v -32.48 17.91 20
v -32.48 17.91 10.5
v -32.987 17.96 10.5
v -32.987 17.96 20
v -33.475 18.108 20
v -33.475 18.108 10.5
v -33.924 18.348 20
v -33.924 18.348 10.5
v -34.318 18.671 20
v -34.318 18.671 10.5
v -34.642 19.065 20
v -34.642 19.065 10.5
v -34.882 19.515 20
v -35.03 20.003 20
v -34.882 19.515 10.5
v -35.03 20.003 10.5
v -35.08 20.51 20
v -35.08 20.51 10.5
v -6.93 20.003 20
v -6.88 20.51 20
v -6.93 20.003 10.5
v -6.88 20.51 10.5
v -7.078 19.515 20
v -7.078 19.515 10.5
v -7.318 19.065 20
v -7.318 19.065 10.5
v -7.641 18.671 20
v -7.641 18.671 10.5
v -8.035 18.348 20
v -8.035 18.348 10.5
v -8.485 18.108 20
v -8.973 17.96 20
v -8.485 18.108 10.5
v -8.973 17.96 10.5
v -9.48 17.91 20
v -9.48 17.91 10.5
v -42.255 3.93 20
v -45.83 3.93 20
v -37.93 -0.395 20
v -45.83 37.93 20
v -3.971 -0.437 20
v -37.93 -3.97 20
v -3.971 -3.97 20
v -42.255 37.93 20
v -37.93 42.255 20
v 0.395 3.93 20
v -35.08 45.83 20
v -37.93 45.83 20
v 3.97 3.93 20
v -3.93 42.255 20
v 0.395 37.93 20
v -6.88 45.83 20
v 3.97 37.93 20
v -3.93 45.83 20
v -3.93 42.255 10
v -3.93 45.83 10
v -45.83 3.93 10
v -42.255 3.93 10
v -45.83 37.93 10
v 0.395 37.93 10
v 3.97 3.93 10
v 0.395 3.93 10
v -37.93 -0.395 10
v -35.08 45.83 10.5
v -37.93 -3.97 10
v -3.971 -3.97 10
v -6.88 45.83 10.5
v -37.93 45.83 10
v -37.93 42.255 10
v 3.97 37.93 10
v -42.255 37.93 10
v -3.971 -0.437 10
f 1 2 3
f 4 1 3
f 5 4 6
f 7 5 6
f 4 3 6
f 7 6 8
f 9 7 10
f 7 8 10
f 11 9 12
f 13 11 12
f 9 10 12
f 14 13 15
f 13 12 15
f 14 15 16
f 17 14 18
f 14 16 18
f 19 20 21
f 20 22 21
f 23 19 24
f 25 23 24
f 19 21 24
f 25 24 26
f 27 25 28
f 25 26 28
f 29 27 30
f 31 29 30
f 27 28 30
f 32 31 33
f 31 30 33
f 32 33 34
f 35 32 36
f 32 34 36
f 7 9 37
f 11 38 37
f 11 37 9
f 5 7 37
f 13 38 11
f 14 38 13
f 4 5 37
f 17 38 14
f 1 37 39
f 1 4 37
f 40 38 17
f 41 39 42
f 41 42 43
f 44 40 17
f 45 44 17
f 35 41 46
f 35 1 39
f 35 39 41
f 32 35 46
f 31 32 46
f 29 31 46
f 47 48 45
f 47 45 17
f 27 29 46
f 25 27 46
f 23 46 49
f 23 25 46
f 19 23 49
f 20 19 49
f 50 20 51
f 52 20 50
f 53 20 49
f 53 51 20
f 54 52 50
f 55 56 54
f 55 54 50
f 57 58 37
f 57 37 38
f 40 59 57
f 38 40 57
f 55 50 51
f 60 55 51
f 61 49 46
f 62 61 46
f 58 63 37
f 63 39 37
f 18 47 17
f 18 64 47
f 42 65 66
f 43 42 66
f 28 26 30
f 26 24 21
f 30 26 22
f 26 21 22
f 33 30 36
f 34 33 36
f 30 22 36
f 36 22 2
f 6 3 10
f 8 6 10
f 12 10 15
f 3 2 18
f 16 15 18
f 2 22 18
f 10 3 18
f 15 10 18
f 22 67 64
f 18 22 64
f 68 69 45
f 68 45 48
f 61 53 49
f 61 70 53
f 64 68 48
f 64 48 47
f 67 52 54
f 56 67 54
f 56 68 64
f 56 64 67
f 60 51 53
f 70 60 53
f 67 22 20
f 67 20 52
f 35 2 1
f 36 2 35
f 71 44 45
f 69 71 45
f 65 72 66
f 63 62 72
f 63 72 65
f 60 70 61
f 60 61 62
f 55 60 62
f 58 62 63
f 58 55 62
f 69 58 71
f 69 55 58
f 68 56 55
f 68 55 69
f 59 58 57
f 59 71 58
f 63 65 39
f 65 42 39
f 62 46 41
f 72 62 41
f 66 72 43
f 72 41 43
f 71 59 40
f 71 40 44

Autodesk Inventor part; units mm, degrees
ref_plane "YZ Plane" through (0, 0, 0) normal (1, 0, 0) x (0, 1, 0)
ref_plane "XZ Plane" through (0, 0, 0) normal (0, 1, 0) x (-1, 0, 0)
ref_plane "XY Plane" through (0, 0, 0) normal (0, 0, 1) x (1, 0, 0)
ref_plane "Work Plane5" through (0, 0, 10) normal (0, 0, 1) x (1, 0, 0)
sketch "Sketch1" plane through (0, 0, 10) normal (0, 0, 1) x (1, 0, 0)
  line L0 (-4.0299, -0.3538) -> (-2.2322, 1.4439) construction
  arc A0 (-1.4439, 2.2322) -> (-2.2322, 1.4439) centre (-0.9299, 0.9299) ccw construction
  line L1 (-1.4439, 2.2322) -> (0.3538, 4.0299) construction
  line L2 (-37.8299, 42.8299) -> (-37.8299, 37.8299) construction
  line L3 (-37.8299, 37.8299) -> (-42.9208, 37.8299) construction
  line L4 (-37.8299, 42.2137) -> (-37.8299, 45.8299) construction
  line L5 (-37.8299, 45.8299) -> (-4.0299, 45.8299) construction
  line L6 (-4.0299, 45.8299) -> (-4.0299, 42.2137) construction
  line L7 (-4.0299, 4.0299) -> (0.3538, 4.0299) projected
  circle A1 centre (-20.9299, 20.9299) radius 17.5 projected
  line L8 (-20.9299, 58.9723) -> (17.1124, 20.9299) construction
  line L9 (17.1124, 20.9299) -> (-20.9299, -17.1124) construction
  line L10 (-20.9299, -17.1124) -> (-58.9723, 20.9299) construction
  line L11 (-58.9723, 20.9299) -> (-20.9299, 58.9723) construction
  line L12 (-20.9299, 58.9723) -> (-20.9299, -17.1124) construction
  line L13 (17.1124, 20.9299) -> (-58.9723, 20.9299) construction
  line L14 (-20.9299, 58.9723) -> (32.8701, 58.9723) construction
  line L15 (-43.4299, 43.4299) -> (1.5701, 43.4299) construction
  line L16 (1.5701, 43.4299) -> (1.5701, -1.5701) construction
  line L17 (1.5701, -1.5701) -> (-43.4299, -1.5701) construction
  line L18 (-43.4299, -1.5701) -> (-43.4299, 43.4299) construction
  line L19 (-43.4299, 43.4299) -> (1.5701, -1.5701) construction
  line L20 (1.5701, 43.4299) -> (-43.4299, -1.5701) construction
  line L21 (-43.4299, 5.3876) -> (-43.4299, 36.4723)
  line L22 (-43.4299, 36.4723) -> (-36.4723, 43.4299)
  line L23 (-36.4723, 43.4299) -> (-5.3876, 43.4299)
  line L24 (-5.3876, 43.4299) -> (1.5701, 36.4723)
  line L25 (1.5701, 36.4723) -> (1.5701, 5.3876)
  line L26 (1.5701, 5.3876) -> (-5.3876, -1.5701)
  line L27 (-5.3876, -1.5701) -> (-36.4723, -1.5701)
  line L28 (-36.4723, -1.5701) -> (-43.4299, 5.3876)
  line L29 (-4.0299, 42.2137) -> (-37.8299, 42.2137) projected
  line L30 (-4.0299, -0.3538) -> (-4.0299, 4.0299) projected
  circle A2 centre (-20.9299, 20.9299) radius 1.5
  line L31 (-10.9299, 10.9299) -> (-30.9299, 10.9299) construction
  line L32 (-30.9299, 10.9299) -> (-30.9299, 30.9299) construction
  line L33 (-30.9299, 30.9299) -> (-10.9299, 30.9299) construction
  line L34 (-10.9299, 30.9299) -> (-10.9299, 10.9299) construction
  line L35 (-10.9299, 10.9299) -> (-30.9299, 30.9299) construction
  line L36 (-30.9299, 10.9299) -> (-10.9299, 30.9299) construction
  circle A3 centre (-30.9299, 30.9299) radius 1.4
  circle A4 centre (-30.9299, 10.9299) radius 1.4
  circle A5 centre (-10.9299, 10.9299) radius 1.4
  line L37 (-45.8299, 37.8299) -> (-42.0723, 37.8299) construction
  line L38 (-42.1723, 37.7299) -> (-45.8299, 37.7299)
  line L39 (-45.8299, 37.7299) -> (-45.8299, 4.1299)
  line L40 (-45.8299, 4.1299) -> (-42.1723, 4.1299)
  line L41 (-42.1723, 4.1299) -> (-42.1723, 37.7299)
  line L42 (-45.8299, 4.0299) -> (-42.0723, 4.0299) construction
  line L43 (-45.8299, 37.8299) -> (-42.0723, 37.8299) projected
  line L44 (-37.7299, 45.8299) -> (-4.1299, 45.8299)
  line L45 (-4.1299, 45.8299) -> (-4.1299, 42.1723)
  line L46 (-4.1299, 42.1723) -> (-37.7299, 42.1723)
  line L47 (-37.7299, 42.1723) -> (-37.7299, 45.8299)
  line L48 (0.4701, 37.8299) -> (0.4701, 4.0299) construction
  line L49 (0.4701, 4.0299) -> (3.9701, 4.0299) construction
  line L50 (3.9701, 37.8299) -> (3.9701, 4.0299) construction
  line L51 (0.4701, 37.8299) -> (3.9701, 37.8299) construction
  line L52 (-45.8299, -3.9701) -> (-4.0299, -3.9701) construction
  line L53 (0.3124, 37.7299) -> (3.9701, 37.7299)
  line L54 (3.9701, 37.7299) -> (3.9701, 4.1299)
  line L55 (3.9701, 4.1299) -> (0.3124, 4.1299)
  line L56 (0.3124, 4.1299) -> (0.3124, 37.7299)
  line L57 (-4.1713, -0.3538) -> (-37.7299, -0.3538)
  line L58 (-37.7299, -0.3538) -> (-37.7299, -3.9701)
  line L59 (-37.7299, -3.9701) -> (-4.1713, -3.9701)
  line L60 (-4.1713, -3.9701) -> (-4.1713, -0.3538)
  point P0 (-37.8299, 4.0299)
  dimension "d18" = 53.8
  dimension "d19" = 45
  dimension "d20" = 53.8
  dimension "d21" = 45
  dimension "d22" = 45
  dimension "d30" = 20
  dimension "d31" = 20
  dimension "d32" = 2.8
  dimension "d33" = 2.8
  dimension "d34" = 2.8
  dimension "d35" = 3
  dimension "d36" = 0.1
  dimension "d37" = 0.1
  dimension "d38" = 0.1
  dimension "d39" = 0.1
extrude "Extrusion1" add sketch "Sketch1" along normal blind 10 contours L30 L26 L57 L28 L41 L22 L46 L24 L56 L7 | L7 L26 L30 | L56 L24 L25 L26 | L26 L25 L24 L53 L54 L55 | L60 L59 L58 L57 L28 L27 L26 | L26 L27 L28 L57 | L46 L22 L29 L24 | L24 L29 L45 | L40 L39 L38 L22 L21 L28 | L28 L21 L22 L41 | L29 L22 L23 L24 | L24 L23 L22 L29 L47 L44 L45 | L47 L29 L22 | A1 | A2 | A3 | A4 | A5
sketch "Skizze4" plane through (0, 0, 20) normal (0, 0, 1) x (1, 0, 0)
  line L0 (-37.7299, 42.1723) -> (-42.1723, 37.7299) projected
  line L1 (-42.1723, 37.7299) -> (-45.8299, 37.7299) projected
  line L2 (-45.8299, 37.7299) -> (-45.8299, 4.1299) construction
  line L3 (-45.8299, 4.1299) -> (-42.1723, 4.1299) projected
  line L4 (-42.1723, 4.1299) -> (-37.6885, -0.3538) projected
  line L5 (-37.6885, -0.3538) -> (-37.7299, -0.3538) projected
  line L6 (-37.7299, -0.3538) -> (-37.7299, -3.9701) projected
  line L7 (-37.7299, -3.9701) -> (-4.1713, -3.9701) construction
  line L8 (-4.1713, -3.9701) -> (-4.1713, -0.3538) projected
  line L9 (-4.1713, -0.3538) -> (0.3124, 4.1299) projected
  line L10 (0.3124, 4.1299) -> (3.9701, 4.1299) projected
  line L11 (3.9701, 4.1299) -> (3.9701, 37.7299) construction
  line L12 (3.9701, 37.7299) -> (0.3124, 37.7299) projected
  line L13 (0.3124, 37.7299) -> (-4.1299, 42.1723) projected
  line L14 (-4.1299, 42.1723) -> (-4.1299, 45.8299) projected
  line L15 (-4.1299, 45.8299) -> (-37.7299, 45.8299) construction
  line L16 (-37.7299, 45.8299) -> (-37.7299, 42.1723) projected
  line L17 (-37.9299, 46.0299) -> (-3.9299, 46.0299) construction
  line L18 (-3.9299, 46.0299) -> (-3.9299, 42.2551)
  line L19 (-3.9299, 42.2551) -> (0.3953, 37.9299)
  line L20 (0.3953, 37.9299) -> (4.1701, 37.9299)
  line L21 (4.1701, 37.9299) -> (4.1701, 3.9299) construction
  line L22 (4.1701, 3.9299) -> (0.3953, 3.9299)
  line L23 (0.3953, 3.9299) -> (-3.9713, -0.4367)
  line L24 (-3.9713, -0.4367) -> (-3.9713, -4.1701)
  line L25 (-3.9713, -4.1701) -> (-37.9299, -4.1701) construction
  line L26 (-37.9299, -4.1701) -> (-37.9299, -0.3953)
  line L27 (-37.9299, -0.3953) -> (-42.2551, 3.9299)
  line L28 (-42.2551, 3.9299) -> (-46.0299, 3.9299)
  line L29 (-46.0299, 3.9299) -> (-46.0299, 37.9299) construction
  line L30 (-46.0299, 37.9299) -> (-42.2551, 37.9299)
  line L31 (-42.2551, 37.9299) -> (-37.9299, 42.2551)
  line L32 (-37.9299, 42.2551) -> (-37.9299, 46.0299)
  line L33 (-45.8299, 37.7299) -> (-45.8299, 37.9299)
  line L34 (-4.1299, 45.8299) -> (-37.7299, 45.8299) projected
  line L35 (-37.7299, 45.8299) -> (-37.9299, 45.8299)
  line L36 (-4.1299, 45.8299) -> (-3.9299, 45.8299)
  line L37 (3.9701, 37.7299) -> (3.9701, 37.9299)
  line L38 (3.9701, 4.1299) -> (3.9701, 37.7299) projected
  line L39 (3.9701, 4.1299) -> (3.9701, 3.9299)
  line L40 (-4.1713, -3.9701) -> (-3.9713, -3.9701)
  line L41 (-37.7299, -3.9701) -> (-37.9299, -3.9701)
  line L42 (-45.8299, 4.1299) -> (-45.8299, 3.9299)
  point P0 (0, 0)
  dimension "d40" = 0.2
extrude "IM_offset" add sketch "Skizze4" against normal up to surface (10 mm away)
sketch "Sketch29" plane through (0, 0, 10) normal (0, 0, -1) x (-1, 0, 0)
  arc A0 (32.4799, 17.9099) -> (35.0799, 20.5099) centre (32.4799, 20.5099) ccw
  arc A1 (9.4799, 46.1099) -> (6.8799, 43.5099) centre (9.4799, 43.5099) ccw
  arc A2 (35.0799, 43.5099) -> (32.4799, 46.1099) centre (32.4799, 43.5099) ccw
  arc A3 (6.8799, 20.5099) -> (9.4799, 17.9099) centre (9.4799, 20.5099) ccw
  line L0 (35.0799, 17.9099) -> (6.8799, 17.9099)
  line L1 (6.8799, 17.9099) -> (6.8799, 46.516)
  line L2 (6.8799, 46.516) -> (35.0799, 46.516)
  line L3 (35.0799, 46.516) -> (35.0799, 17.9099)
  line L4 (35.2799, 17.7099) -> (6.6799, 17.7099)
  line L5 (6.6799, 17.7099) -> (6.6799, 46.716)
  line L6 (6.6799, 46.716) -> (35.2799, 46.716)
  line L7 (35.2799, 46.716) -> (35.2799, 17.7099)
  point P0 (0, 0)
  point P1 (6.8799, 20.5099)
  point P2 (9.4799, 17.9099)
  point P3 (32.4799, 17.9099)
  point P4 (35.0799, 20.5099)
  dimension "d171" = 0.2
extrude "Extrusion23" cut sketch "Sketch29" against normal blind 10 contours L0 A3 L1 L2 L3 A0
sketch "Sketch30" plane through (0, 0, 10) normal (0, 0, -1) x (-1, 0, 0)
  line L0 (35.0799, 45.8299) -> (35.0799, 20.5099) projected
  arc A0 (32.4799, 17.9099) -> (35.0799, 20.5099) centre (32.4799, 20.5099) ccw projected
  line L1 (32.4799, 17.9099) -> (9.4799, 17.9099) projected
  arc A1 (6.8799, 20.5099) -> (9.4799, 17.9099) centre (9.4799, 20.5099) ccw projected
  line L2 (6.8799, 20.5099) -> (6.8799, 45.8299) projected
  line L3 (6.8799, 45.8299) -> (3.9299, 45.8299) projected
  line L4 (3.9299, 45.8299) -> (3.9299, 42.2551) projected
  line L5 (3.9299, 42.2551) -> (-0.3953, 37.9299) projected
  line L6 (-0.3953, 37.9299) -> (-3.9701, 37.9299) projected
  line L7 (-3.9701, 37.9299) -> (-3.9701, 3.9299) projected
  line L8 (-3.9701, 3.9299) -> (-0.3953, 3.9299) projected
  line L9 (-0.3953, 3.9299) -> (3.9713, -0.4367) projected
  line L10 (3.9713, -0.4367) -> (3.9713, -3.9701) projected
  line L11 (3.9713, -3.9701) -> (37.9299, -3.9701) projected
  line L12 (37.9299, -3.9701) -> (37.9299, -0.3953) projected
  line L13 (37.9299, -0.3953) -> (42.2551, 3.9299) projected
  line L14 (42.2551, 3.9299) -> (45.8299, 3.9299) projected
  line L15 (45.8299, 3.9299) -> (45.8299, 37.9299) projected
  line L16 (45.8299, 37.9299) -> (42.2551, 37.9299) projected
  line L17 (42.2551, 37.9299) -> (37.9299, 42.2551) projected
  line L18 (37.9299, 42.2551) -> (37.9299, 45.8299) projected
  line L19 (37.9299, 45.8299) -> (35.0799, 45.8299) projected
  line L20 (37.9299, 45.8299) -> (35.0799, 45.8299) projected
  line L21 (6.8799, 20.5099) -> (6.8799, 45.8299) projected
  line L22 (35.0799, 45.8299) -> (6.8799, 45.8299)
  point P0 (0, 0)
extrude "Extrusion24" add sketch "Sketch30" against normal blind 0.5 contours L0 A0 L1 A1 L2 L22
ref_plane "Arbeitsebene7" through (-20.9299, 3.9299, 10) normal (-1, 0, 0) x (0, 0, 1)
ref_plane "Arbeitsebene8" through (-37.9299, 20.9299, 10) normal (0, 1, 0) x (1, 0, 0)
ref_plane "Arbeitsebene9" through (-20.9299, 3.9299, 10) normal (-1, 0, 0) x (0, 0, 1)
ref_plane "Arbeitsebene10" through (-37.9299, 20.9299, 10) normal (0, -1, 0) x (1, 0, 0)
properties part number "20_Cube_Insert_Fiber_STMount_Center"
